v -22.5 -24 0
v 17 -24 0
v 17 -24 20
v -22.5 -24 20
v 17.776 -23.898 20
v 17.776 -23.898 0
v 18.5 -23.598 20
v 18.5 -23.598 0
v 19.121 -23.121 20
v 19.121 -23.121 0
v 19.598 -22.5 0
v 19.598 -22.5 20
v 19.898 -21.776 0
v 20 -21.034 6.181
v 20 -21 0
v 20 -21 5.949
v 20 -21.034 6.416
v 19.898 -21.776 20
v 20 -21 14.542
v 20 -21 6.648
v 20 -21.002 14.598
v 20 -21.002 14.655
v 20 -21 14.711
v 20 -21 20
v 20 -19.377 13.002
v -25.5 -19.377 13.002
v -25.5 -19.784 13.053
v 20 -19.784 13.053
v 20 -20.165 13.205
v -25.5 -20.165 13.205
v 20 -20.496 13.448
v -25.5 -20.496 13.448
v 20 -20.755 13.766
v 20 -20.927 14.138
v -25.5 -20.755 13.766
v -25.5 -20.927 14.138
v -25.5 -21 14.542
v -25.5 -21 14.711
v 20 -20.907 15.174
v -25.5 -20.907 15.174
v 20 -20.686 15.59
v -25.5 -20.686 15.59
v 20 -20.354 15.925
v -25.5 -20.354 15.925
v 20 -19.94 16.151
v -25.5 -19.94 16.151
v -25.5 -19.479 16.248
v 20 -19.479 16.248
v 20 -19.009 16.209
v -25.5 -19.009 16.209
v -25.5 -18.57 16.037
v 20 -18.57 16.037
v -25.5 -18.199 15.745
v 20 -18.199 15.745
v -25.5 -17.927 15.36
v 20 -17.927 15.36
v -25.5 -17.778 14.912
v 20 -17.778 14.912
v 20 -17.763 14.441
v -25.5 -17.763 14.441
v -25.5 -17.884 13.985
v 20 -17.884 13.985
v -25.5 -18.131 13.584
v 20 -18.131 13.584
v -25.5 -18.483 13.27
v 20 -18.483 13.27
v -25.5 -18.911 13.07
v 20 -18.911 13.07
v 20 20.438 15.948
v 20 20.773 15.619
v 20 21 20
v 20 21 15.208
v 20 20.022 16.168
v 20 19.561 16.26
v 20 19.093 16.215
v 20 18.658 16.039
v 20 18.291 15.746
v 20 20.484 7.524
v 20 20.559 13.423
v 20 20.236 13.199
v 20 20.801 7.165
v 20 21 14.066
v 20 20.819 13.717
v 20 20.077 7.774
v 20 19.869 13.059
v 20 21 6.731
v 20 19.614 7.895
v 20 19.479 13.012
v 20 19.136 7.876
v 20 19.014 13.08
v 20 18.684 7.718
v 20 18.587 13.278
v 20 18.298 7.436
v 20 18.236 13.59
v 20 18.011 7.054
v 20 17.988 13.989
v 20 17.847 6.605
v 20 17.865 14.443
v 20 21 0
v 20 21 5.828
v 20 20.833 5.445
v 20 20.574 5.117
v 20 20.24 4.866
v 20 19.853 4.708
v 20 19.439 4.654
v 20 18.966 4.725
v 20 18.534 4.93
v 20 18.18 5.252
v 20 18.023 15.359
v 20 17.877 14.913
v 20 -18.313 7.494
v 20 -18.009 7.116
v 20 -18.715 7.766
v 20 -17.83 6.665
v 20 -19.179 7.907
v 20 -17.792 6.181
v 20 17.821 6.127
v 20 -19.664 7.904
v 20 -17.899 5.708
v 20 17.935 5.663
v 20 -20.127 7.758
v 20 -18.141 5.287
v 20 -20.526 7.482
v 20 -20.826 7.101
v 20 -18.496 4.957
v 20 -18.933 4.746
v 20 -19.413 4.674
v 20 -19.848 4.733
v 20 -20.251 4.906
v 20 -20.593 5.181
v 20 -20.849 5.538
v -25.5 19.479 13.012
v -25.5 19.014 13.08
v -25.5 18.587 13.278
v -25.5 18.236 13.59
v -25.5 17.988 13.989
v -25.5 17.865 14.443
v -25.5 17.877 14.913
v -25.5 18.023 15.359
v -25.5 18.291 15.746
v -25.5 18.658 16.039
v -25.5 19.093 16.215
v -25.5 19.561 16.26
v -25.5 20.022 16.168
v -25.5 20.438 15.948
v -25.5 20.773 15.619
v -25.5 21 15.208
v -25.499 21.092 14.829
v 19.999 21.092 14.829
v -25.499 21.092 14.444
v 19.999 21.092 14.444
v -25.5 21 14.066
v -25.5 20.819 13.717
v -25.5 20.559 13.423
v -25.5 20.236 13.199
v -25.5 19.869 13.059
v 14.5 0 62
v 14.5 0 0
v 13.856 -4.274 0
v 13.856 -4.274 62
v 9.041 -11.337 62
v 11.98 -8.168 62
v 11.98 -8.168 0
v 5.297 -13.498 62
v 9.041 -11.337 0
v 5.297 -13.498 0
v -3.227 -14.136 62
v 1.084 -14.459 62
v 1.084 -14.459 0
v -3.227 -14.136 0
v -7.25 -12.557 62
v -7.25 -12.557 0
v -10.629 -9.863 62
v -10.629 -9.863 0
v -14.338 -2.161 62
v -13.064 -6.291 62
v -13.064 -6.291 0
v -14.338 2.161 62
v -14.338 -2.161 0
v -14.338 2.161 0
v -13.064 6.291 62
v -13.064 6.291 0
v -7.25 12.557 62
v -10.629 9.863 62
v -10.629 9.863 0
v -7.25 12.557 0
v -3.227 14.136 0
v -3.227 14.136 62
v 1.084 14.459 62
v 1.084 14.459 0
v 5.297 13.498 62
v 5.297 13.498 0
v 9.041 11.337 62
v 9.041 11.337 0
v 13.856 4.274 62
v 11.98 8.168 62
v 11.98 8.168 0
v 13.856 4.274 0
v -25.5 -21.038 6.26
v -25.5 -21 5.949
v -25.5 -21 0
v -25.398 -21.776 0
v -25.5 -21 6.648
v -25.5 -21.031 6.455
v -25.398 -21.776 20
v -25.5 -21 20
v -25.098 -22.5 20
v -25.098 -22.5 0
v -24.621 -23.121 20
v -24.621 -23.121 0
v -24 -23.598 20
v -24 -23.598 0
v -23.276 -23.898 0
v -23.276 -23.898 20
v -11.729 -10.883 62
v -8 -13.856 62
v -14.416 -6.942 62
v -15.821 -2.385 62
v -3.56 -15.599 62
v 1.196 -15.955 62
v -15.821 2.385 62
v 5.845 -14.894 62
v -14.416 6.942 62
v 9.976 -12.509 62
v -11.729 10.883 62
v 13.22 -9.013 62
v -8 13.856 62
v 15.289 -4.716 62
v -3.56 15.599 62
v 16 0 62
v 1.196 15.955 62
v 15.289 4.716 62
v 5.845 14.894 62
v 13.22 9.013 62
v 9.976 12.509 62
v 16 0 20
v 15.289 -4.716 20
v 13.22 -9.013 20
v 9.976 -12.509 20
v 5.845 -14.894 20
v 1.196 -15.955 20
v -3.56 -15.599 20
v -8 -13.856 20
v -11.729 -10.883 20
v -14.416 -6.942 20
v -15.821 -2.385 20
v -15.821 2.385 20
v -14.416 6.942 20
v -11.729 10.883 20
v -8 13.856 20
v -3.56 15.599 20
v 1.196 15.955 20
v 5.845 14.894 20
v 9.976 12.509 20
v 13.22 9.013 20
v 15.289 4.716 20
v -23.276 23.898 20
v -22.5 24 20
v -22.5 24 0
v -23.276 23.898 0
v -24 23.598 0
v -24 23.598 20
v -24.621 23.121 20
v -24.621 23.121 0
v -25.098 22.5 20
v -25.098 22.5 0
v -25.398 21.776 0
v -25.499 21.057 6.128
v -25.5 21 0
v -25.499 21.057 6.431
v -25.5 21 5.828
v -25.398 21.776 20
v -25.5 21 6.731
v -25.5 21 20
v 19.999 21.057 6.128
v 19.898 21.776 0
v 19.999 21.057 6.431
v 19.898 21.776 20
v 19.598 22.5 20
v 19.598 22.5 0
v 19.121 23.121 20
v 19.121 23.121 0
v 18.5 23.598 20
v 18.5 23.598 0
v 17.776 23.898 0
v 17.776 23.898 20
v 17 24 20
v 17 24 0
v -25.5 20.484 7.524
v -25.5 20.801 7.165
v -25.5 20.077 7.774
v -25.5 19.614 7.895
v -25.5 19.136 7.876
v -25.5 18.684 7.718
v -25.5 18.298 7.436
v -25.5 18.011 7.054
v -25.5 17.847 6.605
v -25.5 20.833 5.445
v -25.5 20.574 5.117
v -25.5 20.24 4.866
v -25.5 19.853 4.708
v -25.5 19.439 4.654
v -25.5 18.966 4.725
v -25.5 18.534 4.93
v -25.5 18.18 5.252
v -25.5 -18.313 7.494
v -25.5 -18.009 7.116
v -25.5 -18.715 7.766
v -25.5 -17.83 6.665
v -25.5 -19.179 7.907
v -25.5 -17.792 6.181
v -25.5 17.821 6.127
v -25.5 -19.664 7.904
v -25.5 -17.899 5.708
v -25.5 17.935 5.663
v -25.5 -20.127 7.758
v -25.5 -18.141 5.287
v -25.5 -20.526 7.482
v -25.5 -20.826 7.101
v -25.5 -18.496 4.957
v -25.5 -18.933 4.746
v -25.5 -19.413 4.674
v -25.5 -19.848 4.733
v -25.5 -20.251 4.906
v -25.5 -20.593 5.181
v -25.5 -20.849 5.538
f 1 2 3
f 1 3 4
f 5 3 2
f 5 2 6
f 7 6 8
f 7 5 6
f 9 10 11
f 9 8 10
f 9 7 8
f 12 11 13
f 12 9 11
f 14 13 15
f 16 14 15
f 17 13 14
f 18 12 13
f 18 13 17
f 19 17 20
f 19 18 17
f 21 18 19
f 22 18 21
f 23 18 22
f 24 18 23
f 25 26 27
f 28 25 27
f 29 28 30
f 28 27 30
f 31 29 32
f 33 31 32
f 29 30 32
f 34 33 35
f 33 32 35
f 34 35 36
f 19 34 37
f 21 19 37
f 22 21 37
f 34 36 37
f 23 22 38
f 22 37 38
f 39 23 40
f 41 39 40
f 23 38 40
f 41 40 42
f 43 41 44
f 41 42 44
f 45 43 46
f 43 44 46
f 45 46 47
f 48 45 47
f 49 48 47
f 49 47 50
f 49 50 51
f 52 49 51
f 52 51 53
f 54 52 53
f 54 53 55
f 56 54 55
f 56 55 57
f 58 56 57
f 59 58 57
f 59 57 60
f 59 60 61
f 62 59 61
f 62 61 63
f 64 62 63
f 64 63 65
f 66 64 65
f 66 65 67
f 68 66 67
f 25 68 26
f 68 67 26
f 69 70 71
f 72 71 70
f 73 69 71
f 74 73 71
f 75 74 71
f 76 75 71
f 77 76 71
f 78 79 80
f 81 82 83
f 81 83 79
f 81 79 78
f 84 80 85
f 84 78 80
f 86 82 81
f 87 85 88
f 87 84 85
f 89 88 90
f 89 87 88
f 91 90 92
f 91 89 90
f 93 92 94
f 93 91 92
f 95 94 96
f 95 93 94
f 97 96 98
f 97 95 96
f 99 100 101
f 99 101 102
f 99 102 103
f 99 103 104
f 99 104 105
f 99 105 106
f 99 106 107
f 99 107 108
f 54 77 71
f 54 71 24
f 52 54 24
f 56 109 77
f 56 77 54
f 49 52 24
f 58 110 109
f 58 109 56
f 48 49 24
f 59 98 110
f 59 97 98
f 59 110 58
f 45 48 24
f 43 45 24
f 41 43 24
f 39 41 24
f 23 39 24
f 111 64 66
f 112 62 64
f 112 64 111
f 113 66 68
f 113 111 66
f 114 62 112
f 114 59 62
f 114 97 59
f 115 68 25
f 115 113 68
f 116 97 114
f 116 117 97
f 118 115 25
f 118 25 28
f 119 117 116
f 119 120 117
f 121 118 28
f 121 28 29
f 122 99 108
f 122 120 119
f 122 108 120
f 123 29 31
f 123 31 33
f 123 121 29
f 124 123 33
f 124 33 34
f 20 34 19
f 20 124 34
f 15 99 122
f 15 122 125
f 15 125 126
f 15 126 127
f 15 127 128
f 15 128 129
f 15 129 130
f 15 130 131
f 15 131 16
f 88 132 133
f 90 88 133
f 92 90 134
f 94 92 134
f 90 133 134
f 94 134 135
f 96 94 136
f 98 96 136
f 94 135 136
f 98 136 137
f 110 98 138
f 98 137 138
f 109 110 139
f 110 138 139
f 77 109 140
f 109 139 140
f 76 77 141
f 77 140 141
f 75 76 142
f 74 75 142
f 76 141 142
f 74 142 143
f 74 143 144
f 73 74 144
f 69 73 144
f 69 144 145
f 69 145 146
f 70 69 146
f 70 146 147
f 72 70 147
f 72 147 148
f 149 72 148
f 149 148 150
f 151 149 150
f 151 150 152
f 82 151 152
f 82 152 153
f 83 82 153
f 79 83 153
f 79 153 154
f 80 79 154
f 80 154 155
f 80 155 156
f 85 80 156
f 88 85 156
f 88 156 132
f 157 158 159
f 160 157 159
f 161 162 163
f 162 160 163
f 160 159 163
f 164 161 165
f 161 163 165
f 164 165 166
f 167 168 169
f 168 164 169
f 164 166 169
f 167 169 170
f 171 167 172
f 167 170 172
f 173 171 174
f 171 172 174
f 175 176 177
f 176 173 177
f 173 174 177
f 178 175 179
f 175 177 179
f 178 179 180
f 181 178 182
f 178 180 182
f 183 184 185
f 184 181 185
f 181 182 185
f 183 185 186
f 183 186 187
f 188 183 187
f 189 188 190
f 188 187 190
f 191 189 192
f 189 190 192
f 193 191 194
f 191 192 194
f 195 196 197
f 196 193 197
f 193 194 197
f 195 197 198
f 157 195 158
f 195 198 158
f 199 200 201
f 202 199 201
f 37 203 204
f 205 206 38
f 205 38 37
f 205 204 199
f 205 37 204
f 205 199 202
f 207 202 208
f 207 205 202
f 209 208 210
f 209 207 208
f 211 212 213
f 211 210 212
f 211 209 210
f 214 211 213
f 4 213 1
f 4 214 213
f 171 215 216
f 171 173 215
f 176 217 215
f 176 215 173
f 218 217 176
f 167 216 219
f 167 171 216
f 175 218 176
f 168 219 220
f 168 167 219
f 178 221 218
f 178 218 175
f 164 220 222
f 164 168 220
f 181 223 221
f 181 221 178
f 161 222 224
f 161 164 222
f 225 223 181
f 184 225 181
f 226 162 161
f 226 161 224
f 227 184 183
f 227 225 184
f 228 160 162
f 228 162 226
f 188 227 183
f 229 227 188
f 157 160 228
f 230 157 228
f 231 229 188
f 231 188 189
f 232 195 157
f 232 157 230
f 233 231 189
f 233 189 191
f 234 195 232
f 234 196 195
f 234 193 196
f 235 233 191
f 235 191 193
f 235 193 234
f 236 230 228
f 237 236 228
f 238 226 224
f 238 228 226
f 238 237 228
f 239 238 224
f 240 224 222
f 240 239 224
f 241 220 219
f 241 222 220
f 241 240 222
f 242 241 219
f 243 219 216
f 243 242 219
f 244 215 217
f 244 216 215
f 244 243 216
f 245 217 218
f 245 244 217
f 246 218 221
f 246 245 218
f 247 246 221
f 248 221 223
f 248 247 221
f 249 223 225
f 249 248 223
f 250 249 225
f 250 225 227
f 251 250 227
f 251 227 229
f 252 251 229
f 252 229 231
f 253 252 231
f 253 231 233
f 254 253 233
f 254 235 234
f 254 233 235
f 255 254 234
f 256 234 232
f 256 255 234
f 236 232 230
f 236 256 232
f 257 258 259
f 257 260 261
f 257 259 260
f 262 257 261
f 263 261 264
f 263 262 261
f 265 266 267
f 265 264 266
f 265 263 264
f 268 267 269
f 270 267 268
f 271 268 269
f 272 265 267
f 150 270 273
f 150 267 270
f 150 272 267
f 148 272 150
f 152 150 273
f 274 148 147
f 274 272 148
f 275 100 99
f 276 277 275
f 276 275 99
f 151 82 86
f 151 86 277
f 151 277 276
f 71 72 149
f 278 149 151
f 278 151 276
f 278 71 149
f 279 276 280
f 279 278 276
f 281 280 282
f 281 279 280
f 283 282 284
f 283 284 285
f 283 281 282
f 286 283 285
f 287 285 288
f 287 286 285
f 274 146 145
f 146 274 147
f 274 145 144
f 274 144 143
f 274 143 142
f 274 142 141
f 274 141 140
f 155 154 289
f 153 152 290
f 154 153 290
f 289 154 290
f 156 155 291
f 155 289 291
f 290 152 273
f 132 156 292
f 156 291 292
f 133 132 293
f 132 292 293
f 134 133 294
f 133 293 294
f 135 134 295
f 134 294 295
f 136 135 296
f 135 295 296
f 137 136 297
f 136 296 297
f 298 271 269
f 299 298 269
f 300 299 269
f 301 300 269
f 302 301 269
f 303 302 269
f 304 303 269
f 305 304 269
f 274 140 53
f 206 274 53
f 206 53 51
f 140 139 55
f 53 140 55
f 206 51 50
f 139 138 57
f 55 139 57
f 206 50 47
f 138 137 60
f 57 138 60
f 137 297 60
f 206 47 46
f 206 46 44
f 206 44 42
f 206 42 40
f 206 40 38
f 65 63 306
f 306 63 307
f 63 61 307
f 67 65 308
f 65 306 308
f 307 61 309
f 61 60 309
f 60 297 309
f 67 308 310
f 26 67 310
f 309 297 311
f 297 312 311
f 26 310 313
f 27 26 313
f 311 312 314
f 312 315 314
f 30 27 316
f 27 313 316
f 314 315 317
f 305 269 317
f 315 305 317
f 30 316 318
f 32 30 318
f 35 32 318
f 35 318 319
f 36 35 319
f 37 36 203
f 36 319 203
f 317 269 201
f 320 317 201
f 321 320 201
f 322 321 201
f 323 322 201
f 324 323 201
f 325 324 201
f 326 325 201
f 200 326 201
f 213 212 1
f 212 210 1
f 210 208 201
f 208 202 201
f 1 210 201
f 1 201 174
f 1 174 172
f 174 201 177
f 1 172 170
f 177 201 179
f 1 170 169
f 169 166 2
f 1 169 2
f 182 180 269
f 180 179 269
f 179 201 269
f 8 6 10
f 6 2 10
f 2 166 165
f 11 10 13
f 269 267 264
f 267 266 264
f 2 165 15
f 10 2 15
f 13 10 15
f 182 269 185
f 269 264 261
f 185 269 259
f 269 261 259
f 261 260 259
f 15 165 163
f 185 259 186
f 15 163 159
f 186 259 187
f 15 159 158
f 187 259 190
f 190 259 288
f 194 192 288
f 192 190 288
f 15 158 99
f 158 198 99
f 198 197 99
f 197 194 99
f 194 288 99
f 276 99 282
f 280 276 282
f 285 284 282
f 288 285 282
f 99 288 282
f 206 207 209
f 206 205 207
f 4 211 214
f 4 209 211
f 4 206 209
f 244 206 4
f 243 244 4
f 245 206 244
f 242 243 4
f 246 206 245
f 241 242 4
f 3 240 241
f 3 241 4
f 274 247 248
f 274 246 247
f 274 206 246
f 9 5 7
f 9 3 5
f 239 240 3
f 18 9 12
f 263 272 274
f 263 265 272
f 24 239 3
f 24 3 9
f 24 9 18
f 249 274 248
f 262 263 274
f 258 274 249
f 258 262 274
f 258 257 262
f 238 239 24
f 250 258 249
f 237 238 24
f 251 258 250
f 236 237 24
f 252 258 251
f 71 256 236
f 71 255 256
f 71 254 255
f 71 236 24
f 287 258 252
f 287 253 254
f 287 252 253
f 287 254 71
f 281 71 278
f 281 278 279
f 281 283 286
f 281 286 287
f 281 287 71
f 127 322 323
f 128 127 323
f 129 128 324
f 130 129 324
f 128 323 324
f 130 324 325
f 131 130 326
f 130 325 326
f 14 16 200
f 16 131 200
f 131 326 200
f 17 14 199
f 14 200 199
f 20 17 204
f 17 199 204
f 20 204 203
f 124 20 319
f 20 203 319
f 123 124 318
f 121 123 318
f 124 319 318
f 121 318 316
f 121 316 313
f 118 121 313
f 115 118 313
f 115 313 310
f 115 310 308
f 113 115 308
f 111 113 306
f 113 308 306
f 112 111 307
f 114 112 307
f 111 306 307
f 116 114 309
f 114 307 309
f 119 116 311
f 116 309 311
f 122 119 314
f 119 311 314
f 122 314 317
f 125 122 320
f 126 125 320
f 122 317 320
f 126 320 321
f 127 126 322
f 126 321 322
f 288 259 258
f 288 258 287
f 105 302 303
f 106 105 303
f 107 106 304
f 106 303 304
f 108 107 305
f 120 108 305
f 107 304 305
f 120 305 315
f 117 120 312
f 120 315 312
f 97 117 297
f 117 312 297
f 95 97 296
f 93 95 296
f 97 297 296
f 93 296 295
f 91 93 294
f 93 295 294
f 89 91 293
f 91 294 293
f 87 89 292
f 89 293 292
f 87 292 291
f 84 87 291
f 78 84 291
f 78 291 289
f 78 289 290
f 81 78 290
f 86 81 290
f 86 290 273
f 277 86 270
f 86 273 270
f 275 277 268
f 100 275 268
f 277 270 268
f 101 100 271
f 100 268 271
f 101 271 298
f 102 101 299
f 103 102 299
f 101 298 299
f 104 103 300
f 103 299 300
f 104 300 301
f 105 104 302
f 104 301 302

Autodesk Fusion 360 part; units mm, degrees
sketch "Boceto8" plane through (0, 0, 0) normal (0, 0, 1) x (1, 0, 0)
sketch "Boceto9" plane through (0, 0, 0) normal (0, 0, 1) x (1, 0, 0)
  circle A0 centre (0, 0) radius 14.5
  line L0 (20, 0) -> (20, 20)
  line L1 (20, 0) -> (20, -20)
  circle A1 centre (0, 0) radius 16
  line L2 (20, 20) -> (20, 24)
  line L3 (20, -20) -> (20, -24)
  line L4 (20, -20) -> (20, -24)
  line L5 (20, 0) -> (20, 20)
  line L6 (20, 0) -> (20, -20)
  circle A2 centre (0, 0) radius 16
  circle A3 centre (0, 0) radius 14.5
  line L7 (20, 20) -> (20, 24)
  line L8 (-25.5, 24) -> (-25.5, -24)
  line L9 (-25.5, 24) -> (20, 24)
  line L10 (20, -24) -> (-25.5, -24)
  dimension "d26" = 29
  dimension "d27" = 20
  dimension "d36" = 32
  dimension "d63" = 29
  dimension "d64" = 20
  dimension "d65" = 32
extrude "Extruir8" add sketch "Boceto9" along normal blind 62 contours A1 A2
extrude "Extruir10" add sketch "Boceto9" along normal blind 20 contours L0 L1 L2 L3 L4 L5 L6 L7 L8 L9 L10
fillet "Empalme3" radius 3 4 edges at (-25.5, -24, 10) (-25.5, 24, 10) (20, 24, 10) (20, -24, 10)
hole "Agujero6" at (20, 19.4786, 14.6367) direction (-1, 0, 0) diameter 3.25 depth 80 tip angle 118
hole "Agujero7" at (20, 19.4389, 6.2793) direction (-1, 0, 0) diameter 3.25 depth 80 tip angle 118
sketch "Boceto11" plane through (20, 0, 0) normal (1, 0, 0) x (0, 1, 0)
  arc A0 (21, 6.7303) -> (21, 5.8282) centre (19.4389, 6.2793) ccw
  line L0 (21, 6.7303) -> (21, 14.0658)
  arc A1 (21, 15.2076) -> (21, 14.0658) centre (19.4786, 14.6367) ccw
  line L1 (21, 15.2076) -> (21, 20)
  line L2 (21, 20) -> (-21, 20)
  line L3 (-21, 20) -> (-21, 0)
  line L4 (-21, 0) -> (21, 0)
  line L5 (21, 0) -> (21, 5.8282)
hole "Agujero8" at (20, -19.3772, 14.6266) direction (-1, 0, 0) diameter 3.25 depth 80 tip angle 118
hole "Agujero9" at (20, -19.413, 6.2987) direction (-1, 0, 0) diameter 3.25 depth 80 tip angle 118
extrude "Extruir9" [suppressed]
